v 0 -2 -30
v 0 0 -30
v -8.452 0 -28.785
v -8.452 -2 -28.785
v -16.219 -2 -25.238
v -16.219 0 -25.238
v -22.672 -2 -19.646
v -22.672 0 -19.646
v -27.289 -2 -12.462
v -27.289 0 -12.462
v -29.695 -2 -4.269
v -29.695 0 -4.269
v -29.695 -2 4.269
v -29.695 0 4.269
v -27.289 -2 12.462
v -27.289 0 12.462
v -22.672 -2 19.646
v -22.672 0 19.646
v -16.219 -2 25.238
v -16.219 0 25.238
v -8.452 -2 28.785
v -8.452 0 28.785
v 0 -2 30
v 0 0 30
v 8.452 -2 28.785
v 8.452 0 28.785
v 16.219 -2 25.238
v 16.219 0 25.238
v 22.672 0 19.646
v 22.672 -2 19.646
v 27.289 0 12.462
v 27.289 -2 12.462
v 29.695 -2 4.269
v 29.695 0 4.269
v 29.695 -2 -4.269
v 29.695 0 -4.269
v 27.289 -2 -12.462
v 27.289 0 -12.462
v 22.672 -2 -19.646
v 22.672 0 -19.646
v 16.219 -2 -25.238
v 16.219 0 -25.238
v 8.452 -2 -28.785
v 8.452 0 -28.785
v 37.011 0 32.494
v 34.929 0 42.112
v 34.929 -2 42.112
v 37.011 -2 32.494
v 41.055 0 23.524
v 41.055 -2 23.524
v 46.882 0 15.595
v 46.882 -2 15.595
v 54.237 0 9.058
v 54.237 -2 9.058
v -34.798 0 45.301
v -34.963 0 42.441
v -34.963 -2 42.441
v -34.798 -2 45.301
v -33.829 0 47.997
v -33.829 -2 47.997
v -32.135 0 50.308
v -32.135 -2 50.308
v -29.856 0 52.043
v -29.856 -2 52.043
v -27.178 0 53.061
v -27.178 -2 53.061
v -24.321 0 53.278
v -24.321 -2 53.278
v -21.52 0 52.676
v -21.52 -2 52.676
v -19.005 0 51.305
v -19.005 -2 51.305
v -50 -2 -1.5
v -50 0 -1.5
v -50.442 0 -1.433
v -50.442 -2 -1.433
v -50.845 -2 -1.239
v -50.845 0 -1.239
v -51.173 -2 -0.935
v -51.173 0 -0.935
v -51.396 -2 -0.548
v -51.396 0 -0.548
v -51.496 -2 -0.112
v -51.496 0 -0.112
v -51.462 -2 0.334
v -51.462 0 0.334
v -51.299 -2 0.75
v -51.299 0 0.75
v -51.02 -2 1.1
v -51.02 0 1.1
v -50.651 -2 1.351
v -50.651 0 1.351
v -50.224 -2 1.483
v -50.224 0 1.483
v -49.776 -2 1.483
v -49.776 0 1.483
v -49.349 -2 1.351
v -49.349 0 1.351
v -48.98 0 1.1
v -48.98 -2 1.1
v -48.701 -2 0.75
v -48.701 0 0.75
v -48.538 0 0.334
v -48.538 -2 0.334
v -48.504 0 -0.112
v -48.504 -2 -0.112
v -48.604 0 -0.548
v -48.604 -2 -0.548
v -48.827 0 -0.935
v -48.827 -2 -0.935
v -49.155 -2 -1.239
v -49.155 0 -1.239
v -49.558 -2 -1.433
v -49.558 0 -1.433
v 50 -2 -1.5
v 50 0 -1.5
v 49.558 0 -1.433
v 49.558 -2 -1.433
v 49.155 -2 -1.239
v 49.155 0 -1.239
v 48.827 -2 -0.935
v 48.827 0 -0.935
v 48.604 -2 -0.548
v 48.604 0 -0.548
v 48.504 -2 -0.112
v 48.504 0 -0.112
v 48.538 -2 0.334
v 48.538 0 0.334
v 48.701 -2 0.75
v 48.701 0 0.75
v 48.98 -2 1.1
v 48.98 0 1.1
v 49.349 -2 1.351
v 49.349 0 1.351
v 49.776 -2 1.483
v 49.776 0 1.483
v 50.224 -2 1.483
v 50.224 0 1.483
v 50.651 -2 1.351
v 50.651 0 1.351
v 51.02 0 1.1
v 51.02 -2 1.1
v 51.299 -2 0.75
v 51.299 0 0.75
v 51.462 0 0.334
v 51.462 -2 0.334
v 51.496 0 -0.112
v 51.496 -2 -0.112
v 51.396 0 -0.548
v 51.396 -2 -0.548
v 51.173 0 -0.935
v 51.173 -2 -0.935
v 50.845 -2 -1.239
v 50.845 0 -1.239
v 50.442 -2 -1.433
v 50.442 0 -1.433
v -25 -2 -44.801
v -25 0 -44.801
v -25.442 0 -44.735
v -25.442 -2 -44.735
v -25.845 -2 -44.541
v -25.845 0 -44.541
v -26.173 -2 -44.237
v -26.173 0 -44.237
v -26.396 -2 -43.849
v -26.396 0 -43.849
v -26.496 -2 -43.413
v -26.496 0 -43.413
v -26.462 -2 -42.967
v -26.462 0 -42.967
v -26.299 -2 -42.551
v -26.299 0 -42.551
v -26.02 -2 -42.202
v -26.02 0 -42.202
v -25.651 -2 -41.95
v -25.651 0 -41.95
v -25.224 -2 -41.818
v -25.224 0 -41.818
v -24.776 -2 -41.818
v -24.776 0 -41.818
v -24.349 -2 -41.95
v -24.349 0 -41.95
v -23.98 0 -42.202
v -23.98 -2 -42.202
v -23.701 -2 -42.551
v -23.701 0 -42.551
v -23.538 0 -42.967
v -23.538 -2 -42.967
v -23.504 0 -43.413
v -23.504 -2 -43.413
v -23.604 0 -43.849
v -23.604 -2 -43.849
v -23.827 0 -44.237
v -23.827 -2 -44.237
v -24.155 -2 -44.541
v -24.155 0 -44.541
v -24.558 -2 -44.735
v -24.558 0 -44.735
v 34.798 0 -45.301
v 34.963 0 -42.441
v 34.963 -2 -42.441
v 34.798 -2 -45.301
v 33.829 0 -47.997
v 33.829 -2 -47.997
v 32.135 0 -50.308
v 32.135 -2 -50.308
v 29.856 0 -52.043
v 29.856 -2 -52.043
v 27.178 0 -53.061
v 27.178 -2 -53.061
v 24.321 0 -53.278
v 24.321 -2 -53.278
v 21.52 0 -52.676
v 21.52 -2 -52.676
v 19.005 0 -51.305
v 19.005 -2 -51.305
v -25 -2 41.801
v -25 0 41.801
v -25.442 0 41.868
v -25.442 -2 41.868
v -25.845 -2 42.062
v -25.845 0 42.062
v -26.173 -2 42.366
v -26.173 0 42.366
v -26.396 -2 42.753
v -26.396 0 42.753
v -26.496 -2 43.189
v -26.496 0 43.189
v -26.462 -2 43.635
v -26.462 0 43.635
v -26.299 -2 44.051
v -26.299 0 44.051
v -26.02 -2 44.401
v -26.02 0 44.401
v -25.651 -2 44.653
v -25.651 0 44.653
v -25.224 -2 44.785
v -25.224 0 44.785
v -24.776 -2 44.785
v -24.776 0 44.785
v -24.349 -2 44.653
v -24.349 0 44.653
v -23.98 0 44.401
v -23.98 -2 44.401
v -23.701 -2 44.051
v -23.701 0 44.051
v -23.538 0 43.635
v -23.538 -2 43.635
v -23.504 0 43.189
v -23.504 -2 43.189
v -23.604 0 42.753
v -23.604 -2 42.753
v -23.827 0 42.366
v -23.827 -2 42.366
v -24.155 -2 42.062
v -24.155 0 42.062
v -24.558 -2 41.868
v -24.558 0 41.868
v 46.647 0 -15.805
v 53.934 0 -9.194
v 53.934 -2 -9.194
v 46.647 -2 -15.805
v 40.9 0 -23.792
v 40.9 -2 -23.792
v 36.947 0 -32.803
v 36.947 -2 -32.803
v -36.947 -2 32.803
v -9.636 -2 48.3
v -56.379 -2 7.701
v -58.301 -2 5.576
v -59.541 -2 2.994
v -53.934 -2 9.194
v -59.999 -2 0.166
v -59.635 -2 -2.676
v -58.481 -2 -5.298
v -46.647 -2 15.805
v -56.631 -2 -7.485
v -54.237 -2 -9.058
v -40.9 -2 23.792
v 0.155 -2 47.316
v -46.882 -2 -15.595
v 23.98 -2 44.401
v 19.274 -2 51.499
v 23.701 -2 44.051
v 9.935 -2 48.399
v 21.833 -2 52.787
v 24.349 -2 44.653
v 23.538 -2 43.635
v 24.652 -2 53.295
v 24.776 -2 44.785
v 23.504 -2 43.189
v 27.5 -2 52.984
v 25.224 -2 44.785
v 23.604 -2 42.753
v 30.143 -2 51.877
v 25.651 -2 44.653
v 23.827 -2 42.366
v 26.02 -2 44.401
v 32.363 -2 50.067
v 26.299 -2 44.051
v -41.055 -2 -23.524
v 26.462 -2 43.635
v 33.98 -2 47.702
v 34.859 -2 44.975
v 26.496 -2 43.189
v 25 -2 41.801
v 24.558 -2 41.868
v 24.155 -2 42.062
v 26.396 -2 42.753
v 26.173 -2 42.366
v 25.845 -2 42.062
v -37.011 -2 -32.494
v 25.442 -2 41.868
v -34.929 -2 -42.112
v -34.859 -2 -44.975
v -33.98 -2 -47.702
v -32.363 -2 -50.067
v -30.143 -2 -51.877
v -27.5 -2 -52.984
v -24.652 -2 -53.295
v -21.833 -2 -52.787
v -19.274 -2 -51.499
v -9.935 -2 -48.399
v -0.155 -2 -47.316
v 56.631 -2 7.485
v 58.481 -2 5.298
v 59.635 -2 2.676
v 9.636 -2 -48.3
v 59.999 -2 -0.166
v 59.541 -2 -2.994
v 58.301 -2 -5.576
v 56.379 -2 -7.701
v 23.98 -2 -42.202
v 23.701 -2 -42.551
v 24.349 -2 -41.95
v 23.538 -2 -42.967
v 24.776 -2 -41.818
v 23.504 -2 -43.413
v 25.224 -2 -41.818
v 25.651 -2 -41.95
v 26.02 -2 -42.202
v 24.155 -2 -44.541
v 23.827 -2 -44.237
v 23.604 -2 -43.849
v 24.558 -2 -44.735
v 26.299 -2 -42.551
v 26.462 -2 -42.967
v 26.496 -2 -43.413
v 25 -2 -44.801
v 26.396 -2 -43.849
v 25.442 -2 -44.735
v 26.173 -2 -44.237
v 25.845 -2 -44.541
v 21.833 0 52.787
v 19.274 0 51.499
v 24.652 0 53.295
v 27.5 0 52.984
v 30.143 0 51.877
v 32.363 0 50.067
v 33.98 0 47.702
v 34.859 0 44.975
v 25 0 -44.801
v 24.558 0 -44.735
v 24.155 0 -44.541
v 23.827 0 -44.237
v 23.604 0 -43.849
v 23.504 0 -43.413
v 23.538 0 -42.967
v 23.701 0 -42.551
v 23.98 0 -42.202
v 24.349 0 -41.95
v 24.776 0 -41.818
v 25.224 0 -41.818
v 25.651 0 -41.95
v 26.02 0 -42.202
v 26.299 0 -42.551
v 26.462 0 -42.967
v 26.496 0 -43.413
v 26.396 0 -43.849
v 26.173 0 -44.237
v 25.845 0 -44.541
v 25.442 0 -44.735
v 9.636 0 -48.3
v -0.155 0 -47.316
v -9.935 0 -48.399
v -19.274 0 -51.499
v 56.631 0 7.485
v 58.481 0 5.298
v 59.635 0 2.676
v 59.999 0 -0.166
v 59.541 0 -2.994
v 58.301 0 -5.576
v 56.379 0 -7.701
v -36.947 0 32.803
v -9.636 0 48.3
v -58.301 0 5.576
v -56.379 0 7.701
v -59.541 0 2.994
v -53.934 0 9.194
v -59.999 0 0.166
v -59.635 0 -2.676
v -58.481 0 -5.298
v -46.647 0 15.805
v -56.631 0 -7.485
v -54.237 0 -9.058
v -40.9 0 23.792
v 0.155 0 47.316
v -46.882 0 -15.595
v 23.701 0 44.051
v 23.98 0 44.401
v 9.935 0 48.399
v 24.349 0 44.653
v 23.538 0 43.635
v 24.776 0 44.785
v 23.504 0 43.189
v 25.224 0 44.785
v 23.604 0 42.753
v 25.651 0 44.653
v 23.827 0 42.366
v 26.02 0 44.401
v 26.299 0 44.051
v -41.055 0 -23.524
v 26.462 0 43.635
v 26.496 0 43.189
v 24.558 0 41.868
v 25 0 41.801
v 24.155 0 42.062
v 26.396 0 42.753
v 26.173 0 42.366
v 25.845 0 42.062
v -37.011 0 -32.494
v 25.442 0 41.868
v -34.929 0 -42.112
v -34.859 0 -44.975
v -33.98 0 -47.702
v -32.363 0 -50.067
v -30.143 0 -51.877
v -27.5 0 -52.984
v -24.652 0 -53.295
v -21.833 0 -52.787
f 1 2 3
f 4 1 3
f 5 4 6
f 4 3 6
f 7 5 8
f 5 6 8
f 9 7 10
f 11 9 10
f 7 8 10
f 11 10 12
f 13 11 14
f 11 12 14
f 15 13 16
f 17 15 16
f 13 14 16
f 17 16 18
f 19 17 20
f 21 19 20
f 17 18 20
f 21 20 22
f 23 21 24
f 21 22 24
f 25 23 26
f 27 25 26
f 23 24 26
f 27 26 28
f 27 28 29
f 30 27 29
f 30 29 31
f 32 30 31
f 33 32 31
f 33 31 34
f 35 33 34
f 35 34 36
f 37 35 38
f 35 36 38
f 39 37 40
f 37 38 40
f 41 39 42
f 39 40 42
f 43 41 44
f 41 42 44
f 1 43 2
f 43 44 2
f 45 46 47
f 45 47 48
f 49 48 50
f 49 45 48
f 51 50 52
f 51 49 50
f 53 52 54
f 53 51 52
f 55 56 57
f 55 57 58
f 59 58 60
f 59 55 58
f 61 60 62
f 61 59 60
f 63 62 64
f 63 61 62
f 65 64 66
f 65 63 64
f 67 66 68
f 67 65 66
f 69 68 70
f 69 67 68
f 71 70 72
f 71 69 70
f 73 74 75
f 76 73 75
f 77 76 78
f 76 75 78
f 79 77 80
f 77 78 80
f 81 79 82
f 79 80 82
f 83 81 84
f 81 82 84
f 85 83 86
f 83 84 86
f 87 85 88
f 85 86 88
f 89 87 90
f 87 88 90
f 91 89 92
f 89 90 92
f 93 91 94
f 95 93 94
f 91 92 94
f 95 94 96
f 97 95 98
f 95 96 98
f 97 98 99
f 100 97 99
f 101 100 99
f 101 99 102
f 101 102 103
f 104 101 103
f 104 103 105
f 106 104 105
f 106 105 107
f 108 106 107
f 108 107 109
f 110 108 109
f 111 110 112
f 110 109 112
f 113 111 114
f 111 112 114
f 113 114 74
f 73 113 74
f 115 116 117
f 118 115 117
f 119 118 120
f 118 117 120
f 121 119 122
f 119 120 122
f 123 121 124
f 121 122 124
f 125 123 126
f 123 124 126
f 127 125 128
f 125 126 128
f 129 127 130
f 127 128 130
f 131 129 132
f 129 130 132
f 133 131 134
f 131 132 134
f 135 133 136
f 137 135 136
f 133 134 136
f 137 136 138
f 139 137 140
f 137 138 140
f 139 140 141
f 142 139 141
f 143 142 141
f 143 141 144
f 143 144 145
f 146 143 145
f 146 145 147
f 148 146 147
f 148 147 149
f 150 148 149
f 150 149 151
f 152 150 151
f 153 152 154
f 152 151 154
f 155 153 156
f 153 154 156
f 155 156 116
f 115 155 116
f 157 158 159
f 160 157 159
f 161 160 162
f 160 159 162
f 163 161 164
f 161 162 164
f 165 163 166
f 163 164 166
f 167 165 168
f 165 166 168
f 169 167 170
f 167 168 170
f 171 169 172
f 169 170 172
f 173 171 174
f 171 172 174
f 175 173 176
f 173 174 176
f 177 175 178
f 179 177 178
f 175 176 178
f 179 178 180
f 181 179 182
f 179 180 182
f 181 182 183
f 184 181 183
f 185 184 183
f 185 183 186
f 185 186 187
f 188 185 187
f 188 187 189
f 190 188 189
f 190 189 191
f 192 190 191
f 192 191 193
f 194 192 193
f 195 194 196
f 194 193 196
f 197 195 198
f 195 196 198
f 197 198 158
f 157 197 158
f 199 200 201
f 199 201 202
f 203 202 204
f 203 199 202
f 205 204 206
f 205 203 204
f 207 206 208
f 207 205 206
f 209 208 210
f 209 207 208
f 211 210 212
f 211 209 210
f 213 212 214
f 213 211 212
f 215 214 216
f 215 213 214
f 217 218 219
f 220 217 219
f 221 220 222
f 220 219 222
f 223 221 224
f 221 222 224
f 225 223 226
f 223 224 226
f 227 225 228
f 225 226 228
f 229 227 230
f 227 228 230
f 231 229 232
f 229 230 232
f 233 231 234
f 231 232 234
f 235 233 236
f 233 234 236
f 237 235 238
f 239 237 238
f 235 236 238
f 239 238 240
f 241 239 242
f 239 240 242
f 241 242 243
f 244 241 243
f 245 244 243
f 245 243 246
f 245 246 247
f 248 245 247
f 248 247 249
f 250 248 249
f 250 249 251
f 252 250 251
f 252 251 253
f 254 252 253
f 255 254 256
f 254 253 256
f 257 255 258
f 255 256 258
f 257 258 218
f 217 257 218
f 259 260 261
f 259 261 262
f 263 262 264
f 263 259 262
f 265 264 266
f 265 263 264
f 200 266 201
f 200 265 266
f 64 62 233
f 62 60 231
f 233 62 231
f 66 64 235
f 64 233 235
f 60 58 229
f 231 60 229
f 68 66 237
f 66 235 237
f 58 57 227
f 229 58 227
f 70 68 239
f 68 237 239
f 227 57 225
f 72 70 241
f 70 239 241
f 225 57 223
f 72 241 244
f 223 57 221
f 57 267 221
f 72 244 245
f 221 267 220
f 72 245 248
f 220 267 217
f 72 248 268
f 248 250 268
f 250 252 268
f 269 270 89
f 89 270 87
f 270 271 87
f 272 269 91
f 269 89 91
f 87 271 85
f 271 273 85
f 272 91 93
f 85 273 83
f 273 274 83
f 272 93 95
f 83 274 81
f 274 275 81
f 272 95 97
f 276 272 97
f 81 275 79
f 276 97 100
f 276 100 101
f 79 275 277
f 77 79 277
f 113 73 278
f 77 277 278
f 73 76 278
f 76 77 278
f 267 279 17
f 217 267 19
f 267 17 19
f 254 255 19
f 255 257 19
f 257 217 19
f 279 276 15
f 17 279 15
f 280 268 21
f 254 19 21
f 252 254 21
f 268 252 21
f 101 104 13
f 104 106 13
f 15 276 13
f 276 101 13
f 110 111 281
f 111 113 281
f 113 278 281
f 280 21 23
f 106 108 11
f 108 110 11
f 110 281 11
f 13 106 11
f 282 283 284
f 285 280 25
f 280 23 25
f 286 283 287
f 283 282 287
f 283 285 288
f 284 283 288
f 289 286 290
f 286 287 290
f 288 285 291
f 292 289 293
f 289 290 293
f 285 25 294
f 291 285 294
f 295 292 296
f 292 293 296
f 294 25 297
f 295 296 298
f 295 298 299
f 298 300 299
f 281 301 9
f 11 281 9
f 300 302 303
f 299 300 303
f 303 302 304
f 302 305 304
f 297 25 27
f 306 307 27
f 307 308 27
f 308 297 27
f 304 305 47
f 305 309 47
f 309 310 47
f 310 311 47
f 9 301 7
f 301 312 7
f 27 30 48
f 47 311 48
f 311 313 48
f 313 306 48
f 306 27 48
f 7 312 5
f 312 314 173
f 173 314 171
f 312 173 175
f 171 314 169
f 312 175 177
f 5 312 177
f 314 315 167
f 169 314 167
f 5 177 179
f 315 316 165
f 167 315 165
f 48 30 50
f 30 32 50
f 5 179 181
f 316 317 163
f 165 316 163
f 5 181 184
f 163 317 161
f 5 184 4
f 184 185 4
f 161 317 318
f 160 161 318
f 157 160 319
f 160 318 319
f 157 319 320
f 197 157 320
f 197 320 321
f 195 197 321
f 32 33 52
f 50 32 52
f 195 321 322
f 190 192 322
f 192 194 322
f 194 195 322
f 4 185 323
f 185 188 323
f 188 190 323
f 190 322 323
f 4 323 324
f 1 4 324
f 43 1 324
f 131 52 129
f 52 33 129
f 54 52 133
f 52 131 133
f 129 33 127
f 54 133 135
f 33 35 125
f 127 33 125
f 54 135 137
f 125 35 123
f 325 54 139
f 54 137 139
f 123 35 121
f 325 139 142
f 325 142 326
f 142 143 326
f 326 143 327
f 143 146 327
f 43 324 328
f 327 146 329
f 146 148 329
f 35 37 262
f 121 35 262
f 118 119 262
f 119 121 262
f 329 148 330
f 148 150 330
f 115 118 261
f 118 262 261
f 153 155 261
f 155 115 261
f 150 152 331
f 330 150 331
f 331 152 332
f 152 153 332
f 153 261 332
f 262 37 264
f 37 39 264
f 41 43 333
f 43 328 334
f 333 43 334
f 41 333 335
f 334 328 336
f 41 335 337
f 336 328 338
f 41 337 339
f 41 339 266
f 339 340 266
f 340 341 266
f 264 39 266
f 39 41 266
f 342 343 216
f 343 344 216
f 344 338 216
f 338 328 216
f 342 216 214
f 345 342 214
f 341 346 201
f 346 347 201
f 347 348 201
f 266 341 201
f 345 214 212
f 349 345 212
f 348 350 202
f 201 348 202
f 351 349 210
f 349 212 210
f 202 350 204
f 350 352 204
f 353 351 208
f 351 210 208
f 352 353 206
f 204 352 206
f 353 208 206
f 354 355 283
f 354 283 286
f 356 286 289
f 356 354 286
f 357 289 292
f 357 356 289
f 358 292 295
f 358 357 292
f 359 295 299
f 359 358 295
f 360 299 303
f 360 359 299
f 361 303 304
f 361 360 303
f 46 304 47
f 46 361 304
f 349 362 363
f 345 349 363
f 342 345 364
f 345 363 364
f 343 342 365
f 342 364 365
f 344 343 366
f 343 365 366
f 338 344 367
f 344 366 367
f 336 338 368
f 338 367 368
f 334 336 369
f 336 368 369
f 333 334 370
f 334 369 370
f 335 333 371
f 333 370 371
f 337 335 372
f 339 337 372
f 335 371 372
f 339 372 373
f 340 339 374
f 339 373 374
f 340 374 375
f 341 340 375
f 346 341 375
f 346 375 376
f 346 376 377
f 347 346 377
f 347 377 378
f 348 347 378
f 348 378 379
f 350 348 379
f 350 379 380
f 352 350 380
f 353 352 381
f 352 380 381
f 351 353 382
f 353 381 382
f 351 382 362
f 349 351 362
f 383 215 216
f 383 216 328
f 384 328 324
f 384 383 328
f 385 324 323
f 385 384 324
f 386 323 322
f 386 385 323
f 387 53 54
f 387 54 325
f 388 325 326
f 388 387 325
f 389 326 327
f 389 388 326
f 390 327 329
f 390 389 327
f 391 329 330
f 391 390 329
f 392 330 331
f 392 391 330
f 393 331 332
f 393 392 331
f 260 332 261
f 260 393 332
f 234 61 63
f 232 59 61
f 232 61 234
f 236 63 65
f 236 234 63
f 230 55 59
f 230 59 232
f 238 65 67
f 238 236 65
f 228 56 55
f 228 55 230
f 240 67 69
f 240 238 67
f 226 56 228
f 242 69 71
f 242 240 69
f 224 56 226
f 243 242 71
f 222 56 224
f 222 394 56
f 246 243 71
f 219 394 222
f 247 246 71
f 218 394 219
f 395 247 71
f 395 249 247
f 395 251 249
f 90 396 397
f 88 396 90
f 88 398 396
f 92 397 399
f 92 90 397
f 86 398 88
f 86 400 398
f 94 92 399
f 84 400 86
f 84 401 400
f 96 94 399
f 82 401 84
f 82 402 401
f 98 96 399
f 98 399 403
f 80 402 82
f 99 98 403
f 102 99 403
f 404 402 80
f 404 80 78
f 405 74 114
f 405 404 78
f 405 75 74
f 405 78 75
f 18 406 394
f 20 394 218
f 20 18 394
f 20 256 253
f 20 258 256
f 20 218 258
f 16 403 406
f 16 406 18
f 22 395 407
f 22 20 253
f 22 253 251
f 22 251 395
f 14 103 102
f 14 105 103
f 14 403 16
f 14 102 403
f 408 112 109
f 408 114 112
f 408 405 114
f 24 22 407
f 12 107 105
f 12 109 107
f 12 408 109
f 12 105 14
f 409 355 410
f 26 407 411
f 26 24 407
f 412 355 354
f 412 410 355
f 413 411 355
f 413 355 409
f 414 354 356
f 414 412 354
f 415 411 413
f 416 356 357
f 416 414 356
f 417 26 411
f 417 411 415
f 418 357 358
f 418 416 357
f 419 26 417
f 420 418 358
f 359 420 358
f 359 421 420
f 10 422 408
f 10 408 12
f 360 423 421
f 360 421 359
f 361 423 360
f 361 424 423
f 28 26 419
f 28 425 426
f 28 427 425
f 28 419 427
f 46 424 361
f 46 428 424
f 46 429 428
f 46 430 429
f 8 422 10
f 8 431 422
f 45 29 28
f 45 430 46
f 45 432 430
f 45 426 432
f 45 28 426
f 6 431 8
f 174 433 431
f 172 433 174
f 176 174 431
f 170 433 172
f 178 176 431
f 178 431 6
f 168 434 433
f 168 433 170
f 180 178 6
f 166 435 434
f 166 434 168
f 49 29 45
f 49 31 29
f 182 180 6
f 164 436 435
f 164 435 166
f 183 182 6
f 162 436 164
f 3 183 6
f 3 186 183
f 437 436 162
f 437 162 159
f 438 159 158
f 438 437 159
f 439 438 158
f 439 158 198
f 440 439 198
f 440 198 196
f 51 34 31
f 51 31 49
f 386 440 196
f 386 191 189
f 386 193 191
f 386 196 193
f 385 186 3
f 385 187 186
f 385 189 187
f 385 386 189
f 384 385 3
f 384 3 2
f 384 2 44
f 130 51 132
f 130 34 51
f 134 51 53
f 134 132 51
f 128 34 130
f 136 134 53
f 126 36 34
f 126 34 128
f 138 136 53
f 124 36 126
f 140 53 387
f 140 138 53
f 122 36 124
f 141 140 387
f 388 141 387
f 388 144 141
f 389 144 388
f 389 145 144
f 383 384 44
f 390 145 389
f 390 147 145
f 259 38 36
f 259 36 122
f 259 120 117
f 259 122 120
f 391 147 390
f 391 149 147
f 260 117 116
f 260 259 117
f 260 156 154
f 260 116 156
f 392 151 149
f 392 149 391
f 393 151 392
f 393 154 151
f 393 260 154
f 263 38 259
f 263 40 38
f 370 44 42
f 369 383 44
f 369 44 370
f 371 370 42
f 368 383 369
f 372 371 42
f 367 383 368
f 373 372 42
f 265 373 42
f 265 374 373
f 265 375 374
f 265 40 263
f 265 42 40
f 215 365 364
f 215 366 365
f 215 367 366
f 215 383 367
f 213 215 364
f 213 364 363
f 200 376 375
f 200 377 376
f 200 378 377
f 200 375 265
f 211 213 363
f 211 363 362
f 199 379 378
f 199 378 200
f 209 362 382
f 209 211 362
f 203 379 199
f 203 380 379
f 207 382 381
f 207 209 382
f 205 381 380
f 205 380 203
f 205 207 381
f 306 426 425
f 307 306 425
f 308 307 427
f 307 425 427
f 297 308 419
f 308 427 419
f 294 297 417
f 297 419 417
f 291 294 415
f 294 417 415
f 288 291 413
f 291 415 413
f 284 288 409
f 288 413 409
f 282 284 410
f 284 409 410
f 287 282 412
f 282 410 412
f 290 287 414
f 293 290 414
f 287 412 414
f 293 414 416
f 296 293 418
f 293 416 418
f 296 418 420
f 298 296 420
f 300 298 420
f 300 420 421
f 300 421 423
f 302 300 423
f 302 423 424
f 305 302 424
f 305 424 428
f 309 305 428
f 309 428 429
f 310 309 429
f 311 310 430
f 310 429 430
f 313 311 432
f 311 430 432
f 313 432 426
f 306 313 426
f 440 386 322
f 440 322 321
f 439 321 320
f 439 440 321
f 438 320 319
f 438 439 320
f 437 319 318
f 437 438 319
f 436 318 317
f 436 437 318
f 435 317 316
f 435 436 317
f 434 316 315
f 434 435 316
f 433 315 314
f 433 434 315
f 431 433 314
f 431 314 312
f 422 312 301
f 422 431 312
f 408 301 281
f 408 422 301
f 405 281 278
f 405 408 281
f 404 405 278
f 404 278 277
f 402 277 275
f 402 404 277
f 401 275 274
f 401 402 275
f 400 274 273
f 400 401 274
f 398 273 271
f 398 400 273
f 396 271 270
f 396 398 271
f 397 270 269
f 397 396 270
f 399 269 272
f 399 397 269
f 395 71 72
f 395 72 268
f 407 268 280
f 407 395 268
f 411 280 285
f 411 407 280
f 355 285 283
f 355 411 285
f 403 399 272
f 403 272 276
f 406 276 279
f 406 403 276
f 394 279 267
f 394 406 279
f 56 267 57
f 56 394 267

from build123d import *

# Parameters (mm, degrees)
SKETCH1_R           = 30
SKETCH1_R_2         = 1.5
BOSS_EXTRUDE1_DEPTH = 2


with BuildPart() as part:
    # Sketch1 → Boss-Extrude1 (new body)
    with BuildSketch(Plane(origin=(0, 0, 0), x_dir=(1, 0, 0), z_dir=(0, 1, 0))):
        with BuildLine():
            ThreePointArc((-34.962941109, -42.441151321), (-29.8558191, -52.043181929), (-19.005152341, -51.305131854))
            ThreePointArc((-19.005152341, -51.305131854), (0.154978651, -47.316486178), (19.273644656, -51.499370852))
            ThreePointArc((19.273644656, -51.499370852), (30.142808095, -51.877488756), (34.928971359, -42.111510658))
            ThreePointArc((34.928971359, -42.111510658), (41.054768373, -23.52402764), (54.236585765, -9.05821953))
            ThreePointArc((54.236585765, -9.05821953), (59.998627194, 0.165693174), (53.934123701, 9.193621197))
            ThreePointArc((53.934123701, 9.193621197), (40.899789722, 23.792458538), (34.962941109, 42.441151321))
            ThreePointArc((34.962941109, 42.441151321), (29.8558191, 52.043181929), (19.005152341, 51.305131854))
            ThreePointArc((19.005152341, 51.305131854), (-0.154978651, 47.316486178), (-19.273644656, 51.499370852))
            ThreePointArc((-19.273644656, 51.499370852), (-30.142808095, 51.877488756), (-34.928971359, 42.111510658))
            ThreePointArc((-34.928971359, 42.111510658), (-41.054768373, 23.52402764), (-54.236585765, 9.05821953))
            ThreePointArc((-54.236585765, 9.05821953), (-59.998627194, -0.165693174), (-53.934123701, -9.193621197))
            ThreePointArc((-53.934123701, -9.193621197), (-40.899789722, -23.792458538), (-34.962941109, -42.441151321))
        make_face()
        with Locations(Location((0, 0, 0), (0, 0, 90))):
            Circle(SKETCH1_R, mode=Mode.SUBTRACT)
        with Locations(Location((50, 0, 0), (0, 0, 90))):
            Circle(SKETCH1_R_2, mode=Mode.SUBTRACT)
        with Locations(Location((25, -43.301270189, 0), (0, 0, 90))):
            Circle(SKETCH1_R_2, mode=Mode.SUBTRACT)
        with Locations(Location((25, 43.301270189, 0), (0, 0, 90))):
            Circle(SKETCH1_R_2, mode=Mode.SUBTRACT)
        with Locations(Location((-25, -43.301270189, 0), (0, 0, 90))):
            Circle(SKETCH1_R_2, mode=Mode.SUBTRACT)
        with Locations(Location((-50, 0, 0), (0, 0, 90))):
            Circle(SKETCH1_R_2, mode=Mode.SUBTRACT)
        with Locations(Location((-25, 43.301270189, 0), (0, 0, 90))):
            Circle(SKETCH1_R_2, mode=Mode.SUBTRACT)
    extrude(amount=-BOSS_EXTRUDE1_DEPTH)


solid = part.part
